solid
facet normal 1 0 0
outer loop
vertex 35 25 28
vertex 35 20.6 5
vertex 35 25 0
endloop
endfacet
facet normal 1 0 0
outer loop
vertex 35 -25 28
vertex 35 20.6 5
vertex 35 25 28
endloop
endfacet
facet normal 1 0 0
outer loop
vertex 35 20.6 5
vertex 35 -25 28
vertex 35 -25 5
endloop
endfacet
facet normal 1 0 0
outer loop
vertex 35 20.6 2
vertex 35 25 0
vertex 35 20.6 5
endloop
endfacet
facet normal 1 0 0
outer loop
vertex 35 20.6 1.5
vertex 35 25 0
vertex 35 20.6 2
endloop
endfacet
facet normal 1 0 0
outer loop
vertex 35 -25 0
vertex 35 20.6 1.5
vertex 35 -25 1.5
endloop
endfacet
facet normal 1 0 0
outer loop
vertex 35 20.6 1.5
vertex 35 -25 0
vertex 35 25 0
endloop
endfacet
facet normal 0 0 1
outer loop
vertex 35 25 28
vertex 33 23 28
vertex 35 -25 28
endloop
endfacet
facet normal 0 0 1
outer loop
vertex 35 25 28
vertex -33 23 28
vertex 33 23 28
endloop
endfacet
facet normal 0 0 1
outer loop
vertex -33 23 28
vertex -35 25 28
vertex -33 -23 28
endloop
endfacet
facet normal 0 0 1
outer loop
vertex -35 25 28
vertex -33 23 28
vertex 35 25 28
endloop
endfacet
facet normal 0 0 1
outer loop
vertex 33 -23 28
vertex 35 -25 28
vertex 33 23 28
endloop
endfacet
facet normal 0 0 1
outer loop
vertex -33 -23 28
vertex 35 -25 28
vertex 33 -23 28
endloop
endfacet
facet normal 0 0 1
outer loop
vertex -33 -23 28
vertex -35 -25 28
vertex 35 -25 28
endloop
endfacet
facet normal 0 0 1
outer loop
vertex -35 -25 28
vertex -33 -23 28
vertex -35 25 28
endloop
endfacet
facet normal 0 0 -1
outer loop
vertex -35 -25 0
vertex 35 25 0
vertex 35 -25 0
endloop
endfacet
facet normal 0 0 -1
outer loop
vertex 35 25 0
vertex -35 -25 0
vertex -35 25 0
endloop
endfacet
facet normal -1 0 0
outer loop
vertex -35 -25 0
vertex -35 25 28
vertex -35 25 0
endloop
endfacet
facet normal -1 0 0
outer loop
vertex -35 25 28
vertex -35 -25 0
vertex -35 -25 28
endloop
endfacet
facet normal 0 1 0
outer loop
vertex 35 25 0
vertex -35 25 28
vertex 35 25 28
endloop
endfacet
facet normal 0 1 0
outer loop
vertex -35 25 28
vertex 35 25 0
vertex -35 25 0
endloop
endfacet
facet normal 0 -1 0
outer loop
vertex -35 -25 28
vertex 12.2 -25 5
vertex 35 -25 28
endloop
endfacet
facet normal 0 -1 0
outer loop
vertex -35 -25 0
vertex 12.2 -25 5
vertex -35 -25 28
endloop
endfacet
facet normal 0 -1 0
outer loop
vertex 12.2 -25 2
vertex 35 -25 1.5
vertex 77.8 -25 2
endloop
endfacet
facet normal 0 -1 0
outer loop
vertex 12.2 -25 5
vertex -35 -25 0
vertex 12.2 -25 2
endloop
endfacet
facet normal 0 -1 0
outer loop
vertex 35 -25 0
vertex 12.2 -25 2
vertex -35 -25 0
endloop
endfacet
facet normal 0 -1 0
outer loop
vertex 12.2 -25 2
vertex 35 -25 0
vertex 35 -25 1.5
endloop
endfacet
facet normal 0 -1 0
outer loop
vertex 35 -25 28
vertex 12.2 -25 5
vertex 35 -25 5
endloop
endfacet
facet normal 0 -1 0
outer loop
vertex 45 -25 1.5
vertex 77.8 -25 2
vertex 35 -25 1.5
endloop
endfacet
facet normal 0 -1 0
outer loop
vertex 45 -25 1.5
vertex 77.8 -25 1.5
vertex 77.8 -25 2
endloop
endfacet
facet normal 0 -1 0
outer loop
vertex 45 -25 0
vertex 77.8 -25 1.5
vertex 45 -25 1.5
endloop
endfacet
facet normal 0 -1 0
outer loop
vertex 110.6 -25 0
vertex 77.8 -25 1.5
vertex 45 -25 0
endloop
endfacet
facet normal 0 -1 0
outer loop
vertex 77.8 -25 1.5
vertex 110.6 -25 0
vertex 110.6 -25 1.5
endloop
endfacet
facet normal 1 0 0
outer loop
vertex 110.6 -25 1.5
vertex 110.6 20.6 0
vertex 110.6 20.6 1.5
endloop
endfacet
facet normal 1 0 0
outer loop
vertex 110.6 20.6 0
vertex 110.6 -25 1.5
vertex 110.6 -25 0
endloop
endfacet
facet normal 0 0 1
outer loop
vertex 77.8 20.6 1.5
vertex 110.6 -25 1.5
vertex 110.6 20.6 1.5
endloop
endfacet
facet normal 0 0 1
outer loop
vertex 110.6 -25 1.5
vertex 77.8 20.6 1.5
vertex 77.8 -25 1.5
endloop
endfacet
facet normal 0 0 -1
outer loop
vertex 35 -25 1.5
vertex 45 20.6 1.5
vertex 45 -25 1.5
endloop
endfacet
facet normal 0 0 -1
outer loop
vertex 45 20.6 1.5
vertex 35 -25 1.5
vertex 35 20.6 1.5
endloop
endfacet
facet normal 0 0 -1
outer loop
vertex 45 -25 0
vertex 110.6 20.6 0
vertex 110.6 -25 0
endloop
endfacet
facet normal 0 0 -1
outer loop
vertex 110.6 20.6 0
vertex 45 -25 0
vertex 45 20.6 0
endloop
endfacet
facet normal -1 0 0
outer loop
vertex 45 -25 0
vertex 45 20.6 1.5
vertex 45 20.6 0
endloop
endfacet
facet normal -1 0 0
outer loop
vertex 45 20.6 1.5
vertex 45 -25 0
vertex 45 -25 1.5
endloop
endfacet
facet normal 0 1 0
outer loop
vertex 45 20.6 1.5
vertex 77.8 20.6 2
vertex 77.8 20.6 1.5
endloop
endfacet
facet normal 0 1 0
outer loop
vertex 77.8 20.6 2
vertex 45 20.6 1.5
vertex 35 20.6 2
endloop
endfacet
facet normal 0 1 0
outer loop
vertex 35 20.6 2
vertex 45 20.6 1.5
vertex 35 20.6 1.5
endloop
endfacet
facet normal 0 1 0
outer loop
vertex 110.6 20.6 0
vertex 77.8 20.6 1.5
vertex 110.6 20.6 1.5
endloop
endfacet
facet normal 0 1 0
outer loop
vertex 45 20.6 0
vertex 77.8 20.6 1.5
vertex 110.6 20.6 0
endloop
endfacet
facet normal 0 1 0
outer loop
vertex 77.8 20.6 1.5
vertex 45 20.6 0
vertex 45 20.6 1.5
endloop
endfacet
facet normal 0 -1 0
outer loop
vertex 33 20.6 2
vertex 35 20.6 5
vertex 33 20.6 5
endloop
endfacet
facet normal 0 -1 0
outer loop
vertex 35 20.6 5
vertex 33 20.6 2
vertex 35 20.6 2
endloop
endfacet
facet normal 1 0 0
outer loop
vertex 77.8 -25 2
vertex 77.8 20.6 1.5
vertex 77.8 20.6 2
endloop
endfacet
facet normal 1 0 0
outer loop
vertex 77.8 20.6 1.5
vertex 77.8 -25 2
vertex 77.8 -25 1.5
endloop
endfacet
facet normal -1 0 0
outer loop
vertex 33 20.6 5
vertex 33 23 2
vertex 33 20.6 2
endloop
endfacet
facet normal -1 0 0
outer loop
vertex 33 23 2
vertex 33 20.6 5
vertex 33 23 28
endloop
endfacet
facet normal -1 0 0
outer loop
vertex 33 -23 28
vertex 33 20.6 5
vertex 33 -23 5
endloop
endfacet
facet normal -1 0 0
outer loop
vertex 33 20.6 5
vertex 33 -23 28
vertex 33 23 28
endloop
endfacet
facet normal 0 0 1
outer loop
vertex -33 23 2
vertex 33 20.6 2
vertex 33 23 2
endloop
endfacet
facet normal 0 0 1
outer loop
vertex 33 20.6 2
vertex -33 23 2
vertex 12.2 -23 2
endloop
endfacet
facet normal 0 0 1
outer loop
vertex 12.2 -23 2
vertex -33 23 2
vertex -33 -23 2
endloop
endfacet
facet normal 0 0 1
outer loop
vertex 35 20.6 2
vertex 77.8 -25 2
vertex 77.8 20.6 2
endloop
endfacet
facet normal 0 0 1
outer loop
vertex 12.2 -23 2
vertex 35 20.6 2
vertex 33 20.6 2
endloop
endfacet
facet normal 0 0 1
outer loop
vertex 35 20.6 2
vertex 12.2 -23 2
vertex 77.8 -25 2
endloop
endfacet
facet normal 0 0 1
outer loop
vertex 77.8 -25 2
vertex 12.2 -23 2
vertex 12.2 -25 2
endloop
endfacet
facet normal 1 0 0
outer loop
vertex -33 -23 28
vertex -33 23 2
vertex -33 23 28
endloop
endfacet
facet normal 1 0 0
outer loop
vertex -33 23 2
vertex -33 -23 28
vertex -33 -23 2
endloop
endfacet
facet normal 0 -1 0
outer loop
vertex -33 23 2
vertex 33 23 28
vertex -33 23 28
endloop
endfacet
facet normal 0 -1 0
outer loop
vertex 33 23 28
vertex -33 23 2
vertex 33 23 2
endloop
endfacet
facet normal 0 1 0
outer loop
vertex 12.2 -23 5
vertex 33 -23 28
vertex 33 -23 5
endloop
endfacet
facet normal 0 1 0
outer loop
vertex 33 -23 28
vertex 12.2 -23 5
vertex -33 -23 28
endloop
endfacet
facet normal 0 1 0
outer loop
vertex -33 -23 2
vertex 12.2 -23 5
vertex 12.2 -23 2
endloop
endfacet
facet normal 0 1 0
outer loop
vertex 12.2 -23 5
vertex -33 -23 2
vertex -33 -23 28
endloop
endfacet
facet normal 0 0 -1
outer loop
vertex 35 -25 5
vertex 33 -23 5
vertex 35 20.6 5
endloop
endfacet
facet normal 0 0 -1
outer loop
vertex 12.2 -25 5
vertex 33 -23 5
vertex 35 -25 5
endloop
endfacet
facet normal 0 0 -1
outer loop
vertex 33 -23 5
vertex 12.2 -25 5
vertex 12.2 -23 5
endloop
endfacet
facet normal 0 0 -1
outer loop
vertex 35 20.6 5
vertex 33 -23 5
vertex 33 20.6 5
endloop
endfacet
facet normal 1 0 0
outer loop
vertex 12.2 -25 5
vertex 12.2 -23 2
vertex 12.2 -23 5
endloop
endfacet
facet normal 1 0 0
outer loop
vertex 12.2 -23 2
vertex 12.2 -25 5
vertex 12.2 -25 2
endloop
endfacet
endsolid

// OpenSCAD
// Two-part enclosure for small electronics board
// Print orientation: both parts on the bed, lid on +X side of box

// ---- Box ----
box_x = 70;      // outer length (X)
box_y = 50;      // outer width (Y)
box_z = 30;      // outer height (Z)
wall = 2;        // wall thickness
floor = 2;       // floor thickness

// ---- Lid ----
lip_w = 65.6;    // lip outer length (X)
lip_d = 45.6;    // lip outer width (Y)
lip_h = 4;       // lip height (Z)
lip_t = 1.5;     // lip wall thickness

// ---- Misc ----
eps = 0.5;       // cutter overshoot
gap = 10;        // gap between parts

$fn = 64;

lip_r = lip_h - lip_t;  // lip inner height

difference() {
    union() {
        // Box
        translate([-box_x/2, -box_y/2, 0])
            cube([box_x, box_y, box_z - floor]);
        // Lid (printed upside down, lip on top)
        translate([box_x/2 + gap, -box_y/2, 0])
            cube([lip_w, lip_d, lip_t]);
        translate([box_x/2 + gap - lip_w/2, -box_y/2, lip_t])
            cube([lip_w, lip_d, lip_r]);
    }
    // Open top of box
    translate([-box_x/2 + wall, -box_y/2 + wall, floor])
        cube([box_x - 2*wall, box_y - 2*wall, box_z - floor + eps]);
    // Lip pocket
    translate([box_x/2 + gap - lip_w/2, -box_y/2, lip_t + eps])
        cube([lip_w, lip_d, lip_r + eps]);
}
